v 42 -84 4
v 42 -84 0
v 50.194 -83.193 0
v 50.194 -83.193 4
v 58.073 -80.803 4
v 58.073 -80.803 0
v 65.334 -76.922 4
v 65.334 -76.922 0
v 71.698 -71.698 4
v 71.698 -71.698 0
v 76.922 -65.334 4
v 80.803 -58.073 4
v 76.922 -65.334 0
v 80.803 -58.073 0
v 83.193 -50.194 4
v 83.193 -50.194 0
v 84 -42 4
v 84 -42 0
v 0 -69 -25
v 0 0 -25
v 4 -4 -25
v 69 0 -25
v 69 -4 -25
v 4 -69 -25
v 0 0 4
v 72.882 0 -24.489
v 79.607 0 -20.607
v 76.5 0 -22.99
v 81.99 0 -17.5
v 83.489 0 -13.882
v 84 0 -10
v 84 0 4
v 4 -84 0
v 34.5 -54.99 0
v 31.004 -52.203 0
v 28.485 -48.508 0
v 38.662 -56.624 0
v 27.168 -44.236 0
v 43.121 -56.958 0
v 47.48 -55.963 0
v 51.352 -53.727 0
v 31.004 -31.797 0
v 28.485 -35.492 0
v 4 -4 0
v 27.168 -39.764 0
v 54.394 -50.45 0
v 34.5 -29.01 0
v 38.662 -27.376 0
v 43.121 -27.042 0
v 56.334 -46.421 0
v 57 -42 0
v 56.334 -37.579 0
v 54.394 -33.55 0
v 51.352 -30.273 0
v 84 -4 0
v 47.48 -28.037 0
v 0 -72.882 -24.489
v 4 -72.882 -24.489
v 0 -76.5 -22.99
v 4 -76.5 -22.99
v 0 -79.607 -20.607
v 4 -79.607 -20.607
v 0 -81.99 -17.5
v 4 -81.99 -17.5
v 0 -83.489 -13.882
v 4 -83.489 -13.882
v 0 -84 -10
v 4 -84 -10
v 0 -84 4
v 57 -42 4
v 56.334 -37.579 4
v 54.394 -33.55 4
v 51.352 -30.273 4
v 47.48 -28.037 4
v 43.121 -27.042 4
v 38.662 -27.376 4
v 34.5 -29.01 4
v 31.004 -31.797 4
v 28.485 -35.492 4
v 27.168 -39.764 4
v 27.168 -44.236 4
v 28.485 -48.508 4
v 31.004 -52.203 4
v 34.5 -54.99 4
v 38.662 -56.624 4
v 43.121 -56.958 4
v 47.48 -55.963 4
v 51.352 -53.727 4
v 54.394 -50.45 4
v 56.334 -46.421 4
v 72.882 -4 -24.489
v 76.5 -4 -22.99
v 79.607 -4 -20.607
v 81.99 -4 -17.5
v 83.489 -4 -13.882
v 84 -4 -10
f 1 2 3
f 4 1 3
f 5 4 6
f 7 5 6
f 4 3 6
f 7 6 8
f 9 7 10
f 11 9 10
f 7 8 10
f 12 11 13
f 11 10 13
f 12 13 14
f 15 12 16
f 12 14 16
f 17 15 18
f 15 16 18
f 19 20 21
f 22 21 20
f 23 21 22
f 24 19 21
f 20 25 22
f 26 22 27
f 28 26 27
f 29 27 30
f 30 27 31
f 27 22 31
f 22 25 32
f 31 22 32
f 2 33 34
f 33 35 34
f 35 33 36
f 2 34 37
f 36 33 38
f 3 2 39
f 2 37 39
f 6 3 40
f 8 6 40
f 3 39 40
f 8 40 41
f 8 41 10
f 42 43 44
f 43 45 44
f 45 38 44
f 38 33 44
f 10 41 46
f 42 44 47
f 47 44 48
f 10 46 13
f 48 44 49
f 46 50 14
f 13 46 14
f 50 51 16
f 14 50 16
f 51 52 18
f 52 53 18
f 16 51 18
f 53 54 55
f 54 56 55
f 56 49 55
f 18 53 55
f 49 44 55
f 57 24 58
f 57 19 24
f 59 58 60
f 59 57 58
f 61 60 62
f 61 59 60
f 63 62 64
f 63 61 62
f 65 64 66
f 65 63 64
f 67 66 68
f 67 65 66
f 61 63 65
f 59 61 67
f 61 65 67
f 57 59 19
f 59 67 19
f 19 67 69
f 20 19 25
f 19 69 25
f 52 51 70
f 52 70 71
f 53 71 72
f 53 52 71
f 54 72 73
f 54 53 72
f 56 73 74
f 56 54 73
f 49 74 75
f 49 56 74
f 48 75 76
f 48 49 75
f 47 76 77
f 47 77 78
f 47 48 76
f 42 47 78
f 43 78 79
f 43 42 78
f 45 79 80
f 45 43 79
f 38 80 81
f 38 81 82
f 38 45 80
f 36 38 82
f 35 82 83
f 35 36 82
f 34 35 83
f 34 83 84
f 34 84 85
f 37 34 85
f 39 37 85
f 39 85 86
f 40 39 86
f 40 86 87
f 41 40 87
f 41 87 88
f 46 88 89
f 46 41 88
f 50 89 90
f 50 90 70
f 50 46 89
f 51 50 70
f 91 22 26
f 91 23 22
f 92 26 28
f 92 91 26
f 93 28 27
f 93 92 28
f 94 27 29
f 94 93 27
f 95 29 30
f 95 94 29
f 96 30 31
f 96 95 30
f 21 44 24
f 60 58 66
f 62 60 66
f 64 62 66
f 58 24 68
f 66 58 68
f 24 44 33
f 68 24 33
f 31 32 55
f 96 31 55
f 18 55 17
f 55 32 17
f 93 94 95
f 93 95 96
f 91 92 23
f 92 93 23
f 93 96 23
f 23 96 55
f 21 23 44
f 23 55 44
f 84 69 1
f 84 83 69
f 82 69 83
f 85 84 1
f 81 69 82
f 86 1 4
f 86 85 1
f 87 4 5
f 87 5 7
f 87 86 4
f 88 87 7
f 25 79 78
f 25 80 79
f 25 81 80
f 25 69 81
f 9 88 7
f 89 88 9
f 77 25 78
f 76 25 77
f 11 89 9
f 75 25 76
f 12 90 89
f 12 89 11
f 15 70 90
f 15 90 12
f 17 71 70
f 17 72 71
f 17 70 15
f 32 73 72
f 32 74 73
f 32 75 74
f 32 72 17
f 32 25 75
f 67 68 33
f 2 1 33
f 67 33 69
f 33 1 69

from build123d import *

# Parameters (mm, degrees)
F0_R     = 15
F1_DEPTH = 4
F3_DEPTH = 25
F4_R     = 15


with BuildPart() as f1:
    # F0 (on Top) → F1 (new body)
    with BuildSketch(Plane.XY):
        with BuildLine():
            Line((84, 0), (0, 0))
            Line((0, 0), (0, -84))
            Line((0, -84), (42, -84))
            ThreePointArc((42, -84), (71.698485, -71.698485), (84, -42))
            Line((84, -42), (84, 0))
        make_face()
        with Locations((42, -42)):
            Circle(F0_R, mode=Mode.SUBTRACT)
    extrude(amount=F1_DEPTH)

    # F2 (on face) → F3 (join)
    with BuildSketch(Plane(origin=(0, 0, 0), x_dir=(1, 0, 0), z_dir=(0, 0, -1))):
        Polygon((84, 4), (4, 4), (4, 84), (0, 84), (0, 0), (84, 0), align=None)
    extrude(amount=F3_DEPTH)

    # F4
    f4_edges = [f1.edges().sort_by_distance(p)[0] for p in [
        (2, -84, -25),
        (84, -2, -25),
    ]]
    fillet(f4_edges, radius=F4_R)


solid = f1.part
